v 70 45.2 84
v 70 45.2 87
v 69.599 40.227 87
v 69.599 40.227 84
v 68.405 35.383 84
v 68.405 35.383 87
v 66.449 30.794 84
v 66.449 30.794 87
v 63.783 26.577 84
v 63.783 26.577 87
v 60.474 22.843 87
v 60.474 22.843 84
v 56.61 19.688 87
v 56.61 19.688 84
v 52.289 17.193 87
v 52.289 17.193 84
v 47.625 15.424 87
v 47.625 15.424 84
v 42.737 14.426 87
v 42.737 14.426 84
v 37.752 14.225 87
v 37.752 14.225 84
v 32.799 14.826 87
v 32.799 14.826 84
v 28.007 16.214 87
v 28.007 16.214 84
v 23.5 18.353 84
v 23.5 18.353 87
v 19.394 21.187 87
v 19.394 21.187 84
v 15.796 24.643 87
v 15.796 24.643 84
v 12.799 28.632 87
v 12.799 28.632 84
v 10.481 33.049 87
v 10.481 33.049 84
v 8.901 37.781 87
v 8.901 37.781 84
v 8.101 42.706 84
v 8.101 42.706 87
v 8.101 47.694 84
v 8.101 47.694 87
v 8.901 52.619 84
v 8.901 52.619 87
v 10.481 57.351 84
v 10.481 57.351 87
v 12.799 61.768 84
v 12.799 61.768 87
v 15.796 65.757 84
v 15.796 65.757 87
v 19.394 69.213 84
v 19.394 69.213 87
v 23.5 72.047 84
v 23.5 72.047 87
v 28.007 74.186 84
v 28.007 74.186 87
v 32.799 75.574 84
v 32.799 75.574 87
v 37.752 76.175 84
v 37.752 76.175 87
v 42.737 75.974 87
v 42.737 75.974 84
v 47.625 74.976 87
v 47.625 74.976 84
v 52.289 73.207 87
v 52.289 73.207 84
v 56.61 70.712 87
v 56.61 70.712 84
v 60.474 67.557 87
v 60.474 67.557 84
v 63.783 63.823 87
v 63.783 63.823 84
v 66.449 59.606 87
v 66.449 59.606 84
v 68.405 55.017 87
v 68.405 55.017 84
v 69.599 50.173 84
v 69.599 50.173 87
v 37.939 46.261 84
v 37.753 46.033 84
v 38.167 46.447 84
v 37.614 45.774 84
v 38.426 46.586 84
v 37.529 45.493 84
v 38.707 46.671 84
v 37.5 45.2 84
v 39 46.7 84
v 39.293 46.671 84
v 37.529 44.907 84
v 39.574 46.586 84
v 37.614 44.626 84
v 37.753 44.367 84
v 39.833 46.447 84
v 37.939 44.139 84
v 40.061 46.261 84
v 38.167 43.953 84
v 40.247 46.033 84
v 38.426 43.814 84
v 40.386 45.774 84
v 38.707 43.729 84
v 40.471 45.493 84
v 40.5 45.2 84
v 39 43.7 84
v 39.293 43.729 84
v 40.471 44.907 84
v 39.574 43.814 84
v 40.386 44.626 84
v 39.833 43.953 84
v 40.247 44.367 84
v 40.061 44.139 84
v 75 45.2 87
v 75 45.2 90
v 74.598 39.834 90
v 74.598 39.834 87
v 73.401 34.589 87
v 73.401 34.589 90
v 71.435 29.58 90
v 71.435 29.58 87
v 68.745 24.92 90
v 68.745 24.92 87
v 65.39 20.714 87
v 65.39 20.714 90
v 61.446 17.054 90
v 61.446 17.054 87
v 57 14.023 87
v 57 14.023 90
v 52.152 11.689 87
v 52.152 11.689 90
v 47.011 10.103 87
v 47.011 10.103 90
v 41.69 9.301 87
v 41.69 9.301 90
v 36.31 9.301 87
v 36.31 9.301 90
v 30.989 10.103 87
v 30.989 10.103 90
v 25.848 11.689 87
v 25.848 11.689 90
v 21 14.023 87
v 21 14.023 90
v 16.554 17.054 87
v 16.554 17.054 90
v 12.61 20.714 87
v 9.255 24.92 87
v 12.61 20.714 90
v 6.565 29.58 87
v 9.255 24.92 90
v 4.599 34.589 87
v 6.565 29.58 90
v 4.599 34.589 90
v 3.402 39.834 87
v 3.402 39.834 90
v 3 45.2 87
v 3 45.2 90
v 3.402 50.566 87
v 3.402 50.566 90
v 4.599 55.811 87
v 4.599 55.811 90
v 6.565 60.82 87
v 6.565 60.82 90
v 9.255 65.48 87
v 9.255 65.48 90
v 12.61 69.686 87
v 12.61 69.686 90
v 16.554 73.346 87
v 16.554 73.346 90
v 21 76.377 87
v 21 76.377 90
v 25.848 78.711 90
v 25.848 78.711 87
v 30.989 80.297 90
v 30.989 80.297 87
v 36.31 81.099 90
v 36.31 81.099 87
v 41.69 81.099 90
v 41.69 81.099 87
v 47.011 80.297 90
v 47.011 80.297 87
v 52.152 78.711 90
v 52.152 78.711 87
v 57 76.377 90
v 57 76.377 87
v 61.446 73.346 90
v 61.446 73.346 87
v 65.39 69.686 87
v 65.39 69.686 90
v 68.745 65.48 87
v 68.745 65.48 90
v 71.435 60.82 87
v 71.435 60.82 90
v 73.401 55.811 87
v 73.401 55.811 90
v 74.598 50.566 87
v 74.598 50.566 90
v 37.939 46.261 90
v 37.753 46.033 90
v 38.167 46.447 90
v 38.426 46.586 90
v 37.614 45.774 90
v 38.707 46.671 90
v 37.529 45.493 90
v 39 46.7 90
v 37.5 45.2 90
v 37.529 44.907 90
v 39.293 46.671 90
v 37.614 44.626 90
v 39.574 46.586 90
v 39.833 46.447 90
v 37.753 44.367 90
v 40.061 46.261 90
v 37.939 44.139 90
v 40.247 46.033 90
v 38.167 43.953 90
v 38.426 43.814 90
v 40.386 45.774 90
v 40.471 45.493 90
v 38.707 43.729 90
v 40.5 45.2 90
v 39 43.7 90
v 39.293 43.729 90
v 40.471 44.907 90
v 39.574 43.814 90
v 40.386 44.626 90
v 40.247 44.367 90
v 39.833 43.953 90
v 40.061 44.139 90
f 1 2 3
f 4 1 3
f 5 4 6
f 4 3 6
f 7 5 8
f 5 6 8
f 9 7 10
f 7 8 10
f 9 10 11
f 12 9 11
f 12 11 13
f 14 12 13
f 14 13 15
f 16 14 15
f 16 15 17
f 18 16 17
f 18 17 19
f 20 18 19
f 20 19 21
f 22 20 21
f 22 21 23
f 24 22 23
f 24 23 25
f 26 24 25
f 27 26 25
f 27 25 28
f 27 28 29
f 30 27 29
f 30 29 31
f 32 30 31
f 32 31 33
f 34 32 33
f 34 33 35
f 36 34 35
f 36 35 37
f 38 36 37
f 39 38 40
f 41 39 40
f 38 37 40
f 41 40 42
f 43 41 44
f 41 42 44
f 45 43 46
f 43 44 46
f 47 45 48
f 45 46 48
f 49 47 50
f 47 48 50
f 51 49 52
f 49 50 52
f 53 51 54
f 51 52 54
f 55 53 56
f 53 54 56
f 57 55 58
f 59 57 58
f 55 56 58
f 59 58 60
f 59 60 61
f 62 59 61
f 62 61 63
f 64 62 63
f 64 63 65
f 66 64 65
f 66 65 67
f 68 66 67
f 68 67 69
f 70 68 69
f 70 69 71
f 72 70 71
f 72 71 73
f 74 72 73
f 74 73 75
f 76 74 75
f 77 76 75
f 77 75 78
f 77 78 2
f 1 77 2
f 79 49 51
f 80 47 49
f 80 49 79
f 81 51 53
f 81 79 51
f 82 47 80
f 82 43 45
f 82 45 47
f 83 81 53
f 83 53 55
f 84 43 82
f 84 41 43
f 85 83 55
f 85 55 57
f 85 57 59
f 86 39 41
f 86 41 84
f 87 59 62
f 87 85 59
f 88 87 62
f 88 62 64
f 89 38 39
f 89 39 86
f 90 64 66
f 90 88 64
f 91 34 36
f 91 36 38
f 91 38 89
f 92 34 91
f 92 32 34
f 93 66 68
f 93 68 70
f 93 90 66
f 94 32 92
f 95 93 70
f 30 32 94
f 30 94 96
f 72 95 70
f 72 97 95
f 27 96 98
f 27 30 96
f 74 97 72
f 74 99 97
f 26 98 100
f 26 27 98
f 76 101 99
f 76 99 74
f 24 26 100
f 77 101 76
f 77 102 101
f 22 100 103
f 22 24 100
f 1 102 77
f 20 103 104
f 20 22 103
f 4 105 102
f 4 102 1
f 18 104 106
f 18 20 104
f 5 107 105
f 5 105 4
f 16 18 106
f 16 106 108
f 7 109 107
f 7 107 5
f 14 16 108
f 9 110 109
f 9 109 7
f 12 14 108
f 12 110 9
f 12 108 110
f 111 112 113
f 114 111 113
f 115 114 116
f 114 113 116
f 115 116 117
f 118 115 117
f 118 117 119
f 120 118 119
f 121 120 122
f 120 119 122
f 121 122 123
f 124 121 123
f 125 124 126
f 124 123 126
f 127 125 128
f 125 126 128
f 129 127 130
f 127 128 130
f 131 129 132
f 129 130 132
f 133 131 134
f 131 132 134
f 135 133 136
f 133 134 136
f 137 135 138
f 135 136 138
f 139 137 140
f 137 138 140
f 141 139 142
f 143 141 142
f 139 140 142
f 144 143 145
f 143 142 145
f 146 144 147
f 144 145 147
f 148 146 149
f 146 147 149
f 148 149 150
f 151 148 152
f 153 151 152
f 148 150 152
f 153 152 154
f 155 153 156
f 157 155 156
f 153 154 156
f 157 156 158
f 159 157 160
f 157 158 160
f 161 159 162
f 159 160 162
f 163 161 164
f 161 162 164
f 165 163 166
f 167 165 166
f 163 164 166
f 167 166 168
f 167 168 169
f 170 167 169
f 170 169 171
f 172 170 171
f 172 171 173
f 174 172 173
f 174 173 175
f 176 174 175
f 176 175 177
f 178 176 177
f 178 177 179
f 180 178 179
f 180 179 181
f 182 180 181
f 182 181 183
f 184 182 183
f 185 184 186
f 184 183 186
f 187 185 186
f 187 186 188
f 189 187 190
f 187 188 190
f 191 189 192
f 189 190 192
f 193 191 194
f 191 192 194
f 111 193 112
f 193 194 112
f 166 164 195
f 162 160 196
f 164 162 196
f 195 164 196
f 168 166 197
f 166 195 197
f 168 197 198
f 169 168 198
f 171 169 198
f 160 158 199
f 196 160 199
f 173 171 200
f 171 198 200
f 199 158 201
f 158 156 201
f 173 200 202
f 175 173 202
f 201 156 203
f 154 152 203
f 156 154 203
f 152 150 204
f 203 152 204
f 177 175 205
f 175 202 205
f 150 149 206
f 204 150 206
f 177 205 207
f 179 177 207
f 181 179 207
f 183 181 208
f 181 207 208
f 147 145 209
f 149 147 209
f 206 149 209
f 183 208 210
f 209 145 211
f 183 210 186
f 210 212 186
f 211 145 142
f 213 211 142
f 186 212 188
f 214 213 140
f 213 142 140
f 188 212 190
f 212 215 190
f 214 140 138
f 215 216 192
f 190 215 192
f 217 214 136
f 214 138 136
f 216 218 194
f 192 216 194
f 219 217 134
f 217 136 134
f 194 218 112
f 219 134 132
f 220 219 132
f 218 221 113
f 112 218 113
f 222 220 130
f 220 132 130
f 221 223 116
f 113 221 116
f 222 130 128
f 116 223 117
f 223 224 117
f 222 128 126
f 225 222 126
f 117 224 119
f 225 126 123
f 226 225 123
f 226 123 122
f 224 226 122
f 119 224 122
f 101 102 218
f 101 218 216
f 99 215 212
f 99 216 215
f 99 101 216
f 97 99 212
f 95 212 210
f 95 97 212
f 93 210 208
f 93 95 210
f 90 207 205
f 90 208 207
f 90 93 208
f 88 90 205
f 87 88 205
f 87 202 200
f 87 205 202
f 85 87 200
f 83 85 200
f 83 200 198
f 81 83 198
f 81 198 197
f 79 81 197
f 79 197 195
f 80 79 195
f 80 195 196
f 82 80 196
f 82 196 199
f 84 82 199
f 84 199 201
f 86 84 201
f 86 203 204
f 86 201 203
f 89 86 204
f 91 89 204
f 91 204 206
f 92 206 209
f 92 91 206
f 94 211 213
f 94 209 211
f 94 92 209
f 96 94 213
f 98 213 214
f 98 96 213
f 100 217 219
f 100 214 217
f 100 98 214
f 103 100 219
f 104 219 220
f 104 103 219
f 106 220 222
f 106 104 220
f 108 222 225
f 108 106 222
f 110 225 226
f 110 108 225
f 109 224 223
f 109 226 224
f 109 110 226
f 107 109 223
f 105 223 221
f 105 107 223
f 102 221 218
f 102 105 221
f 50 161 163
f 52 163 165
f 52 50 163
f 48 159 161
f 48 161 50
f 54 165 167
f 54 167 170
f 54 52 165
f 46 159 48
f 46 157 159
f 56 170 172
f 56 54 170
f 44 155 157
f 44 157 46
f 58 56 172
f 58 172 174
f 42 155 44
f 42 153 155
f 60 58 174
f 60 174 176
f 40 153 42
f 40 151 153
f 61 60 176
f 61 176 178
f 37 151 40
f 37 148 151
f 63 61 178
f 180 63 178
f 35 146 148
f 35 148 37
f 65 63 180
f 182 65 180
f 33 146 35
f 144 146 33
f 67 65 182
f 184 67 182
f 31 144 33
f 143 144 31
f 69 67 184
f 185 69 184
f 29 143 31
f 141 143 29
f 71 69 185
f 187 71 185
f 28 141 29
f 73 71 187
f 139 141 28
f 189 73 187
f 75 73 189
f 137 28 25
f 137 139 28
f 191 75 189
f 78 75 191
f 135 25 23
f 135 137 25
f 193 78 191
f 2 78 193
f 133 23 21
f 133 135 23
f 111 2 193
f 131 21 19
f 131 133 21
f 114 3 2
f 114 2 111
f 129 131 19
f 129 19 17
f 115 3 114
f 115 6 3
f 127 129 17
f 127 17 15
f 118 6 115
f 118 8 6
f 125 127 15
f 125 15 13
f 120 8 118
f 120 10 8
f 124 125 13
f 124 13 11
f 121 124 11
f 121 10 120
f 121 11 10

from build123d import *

# Parameters (mm, degrees)
CYLINDER052_R             = 1.5
CYLINDER052_DEPTH         = 10
CYLINDER048_R             = 31
CYLINDER048_DEPTH         = 6
CYLINDER047_R             = 36
CYLINDER047_DEPTH         = 3
FUSION025_PLACEMENT_ANGLE = 180


with BuildPart() as cylinder052:
    # Cylinder052 → Cylinder052 (new body)
    with BuildSketch(Plane(origin=(39, 45.2, 83), x_dir=(1, 0, 0), z_dir=(0, 0, 1))):
        Circle(CYLINDER052_R)
    extrude(amount=CYLINDER052_DEPTH)


with BuildPart() as cylinder048:
    # Cylinder048 → Cylinder048 (new body)
    with BuildSketch(Plane.XY):
        Circle(CYLINDER048_R)
    extrude(amount=CYLINDER048_DEPTH)


with BuildPart() as cap:
    # Cylinder047 → Cylinder047 (new body)
    with BuildSketch(Plane.XY):
        Circle(CYLINDER047_R)
    extrude(amount=CYLINDER047_DEPTH)

    # Fusion025: union Cylinder048
    add(cylinder048.part)


with BuildPart() as cap_1:
    # Fusion025 placement: moved
    add(cap.part.moved(Location((39, 45.2, 90))).rotate(Axis((39, 45.2, 90), (1, 0, 0)), FUSION025_PLACEMENT_ANGLE))

    # Cut055: cut Cylinder052
    add(cylinder052.part, mode=Mode.SUBTRACT)


solid = cap_1.part
